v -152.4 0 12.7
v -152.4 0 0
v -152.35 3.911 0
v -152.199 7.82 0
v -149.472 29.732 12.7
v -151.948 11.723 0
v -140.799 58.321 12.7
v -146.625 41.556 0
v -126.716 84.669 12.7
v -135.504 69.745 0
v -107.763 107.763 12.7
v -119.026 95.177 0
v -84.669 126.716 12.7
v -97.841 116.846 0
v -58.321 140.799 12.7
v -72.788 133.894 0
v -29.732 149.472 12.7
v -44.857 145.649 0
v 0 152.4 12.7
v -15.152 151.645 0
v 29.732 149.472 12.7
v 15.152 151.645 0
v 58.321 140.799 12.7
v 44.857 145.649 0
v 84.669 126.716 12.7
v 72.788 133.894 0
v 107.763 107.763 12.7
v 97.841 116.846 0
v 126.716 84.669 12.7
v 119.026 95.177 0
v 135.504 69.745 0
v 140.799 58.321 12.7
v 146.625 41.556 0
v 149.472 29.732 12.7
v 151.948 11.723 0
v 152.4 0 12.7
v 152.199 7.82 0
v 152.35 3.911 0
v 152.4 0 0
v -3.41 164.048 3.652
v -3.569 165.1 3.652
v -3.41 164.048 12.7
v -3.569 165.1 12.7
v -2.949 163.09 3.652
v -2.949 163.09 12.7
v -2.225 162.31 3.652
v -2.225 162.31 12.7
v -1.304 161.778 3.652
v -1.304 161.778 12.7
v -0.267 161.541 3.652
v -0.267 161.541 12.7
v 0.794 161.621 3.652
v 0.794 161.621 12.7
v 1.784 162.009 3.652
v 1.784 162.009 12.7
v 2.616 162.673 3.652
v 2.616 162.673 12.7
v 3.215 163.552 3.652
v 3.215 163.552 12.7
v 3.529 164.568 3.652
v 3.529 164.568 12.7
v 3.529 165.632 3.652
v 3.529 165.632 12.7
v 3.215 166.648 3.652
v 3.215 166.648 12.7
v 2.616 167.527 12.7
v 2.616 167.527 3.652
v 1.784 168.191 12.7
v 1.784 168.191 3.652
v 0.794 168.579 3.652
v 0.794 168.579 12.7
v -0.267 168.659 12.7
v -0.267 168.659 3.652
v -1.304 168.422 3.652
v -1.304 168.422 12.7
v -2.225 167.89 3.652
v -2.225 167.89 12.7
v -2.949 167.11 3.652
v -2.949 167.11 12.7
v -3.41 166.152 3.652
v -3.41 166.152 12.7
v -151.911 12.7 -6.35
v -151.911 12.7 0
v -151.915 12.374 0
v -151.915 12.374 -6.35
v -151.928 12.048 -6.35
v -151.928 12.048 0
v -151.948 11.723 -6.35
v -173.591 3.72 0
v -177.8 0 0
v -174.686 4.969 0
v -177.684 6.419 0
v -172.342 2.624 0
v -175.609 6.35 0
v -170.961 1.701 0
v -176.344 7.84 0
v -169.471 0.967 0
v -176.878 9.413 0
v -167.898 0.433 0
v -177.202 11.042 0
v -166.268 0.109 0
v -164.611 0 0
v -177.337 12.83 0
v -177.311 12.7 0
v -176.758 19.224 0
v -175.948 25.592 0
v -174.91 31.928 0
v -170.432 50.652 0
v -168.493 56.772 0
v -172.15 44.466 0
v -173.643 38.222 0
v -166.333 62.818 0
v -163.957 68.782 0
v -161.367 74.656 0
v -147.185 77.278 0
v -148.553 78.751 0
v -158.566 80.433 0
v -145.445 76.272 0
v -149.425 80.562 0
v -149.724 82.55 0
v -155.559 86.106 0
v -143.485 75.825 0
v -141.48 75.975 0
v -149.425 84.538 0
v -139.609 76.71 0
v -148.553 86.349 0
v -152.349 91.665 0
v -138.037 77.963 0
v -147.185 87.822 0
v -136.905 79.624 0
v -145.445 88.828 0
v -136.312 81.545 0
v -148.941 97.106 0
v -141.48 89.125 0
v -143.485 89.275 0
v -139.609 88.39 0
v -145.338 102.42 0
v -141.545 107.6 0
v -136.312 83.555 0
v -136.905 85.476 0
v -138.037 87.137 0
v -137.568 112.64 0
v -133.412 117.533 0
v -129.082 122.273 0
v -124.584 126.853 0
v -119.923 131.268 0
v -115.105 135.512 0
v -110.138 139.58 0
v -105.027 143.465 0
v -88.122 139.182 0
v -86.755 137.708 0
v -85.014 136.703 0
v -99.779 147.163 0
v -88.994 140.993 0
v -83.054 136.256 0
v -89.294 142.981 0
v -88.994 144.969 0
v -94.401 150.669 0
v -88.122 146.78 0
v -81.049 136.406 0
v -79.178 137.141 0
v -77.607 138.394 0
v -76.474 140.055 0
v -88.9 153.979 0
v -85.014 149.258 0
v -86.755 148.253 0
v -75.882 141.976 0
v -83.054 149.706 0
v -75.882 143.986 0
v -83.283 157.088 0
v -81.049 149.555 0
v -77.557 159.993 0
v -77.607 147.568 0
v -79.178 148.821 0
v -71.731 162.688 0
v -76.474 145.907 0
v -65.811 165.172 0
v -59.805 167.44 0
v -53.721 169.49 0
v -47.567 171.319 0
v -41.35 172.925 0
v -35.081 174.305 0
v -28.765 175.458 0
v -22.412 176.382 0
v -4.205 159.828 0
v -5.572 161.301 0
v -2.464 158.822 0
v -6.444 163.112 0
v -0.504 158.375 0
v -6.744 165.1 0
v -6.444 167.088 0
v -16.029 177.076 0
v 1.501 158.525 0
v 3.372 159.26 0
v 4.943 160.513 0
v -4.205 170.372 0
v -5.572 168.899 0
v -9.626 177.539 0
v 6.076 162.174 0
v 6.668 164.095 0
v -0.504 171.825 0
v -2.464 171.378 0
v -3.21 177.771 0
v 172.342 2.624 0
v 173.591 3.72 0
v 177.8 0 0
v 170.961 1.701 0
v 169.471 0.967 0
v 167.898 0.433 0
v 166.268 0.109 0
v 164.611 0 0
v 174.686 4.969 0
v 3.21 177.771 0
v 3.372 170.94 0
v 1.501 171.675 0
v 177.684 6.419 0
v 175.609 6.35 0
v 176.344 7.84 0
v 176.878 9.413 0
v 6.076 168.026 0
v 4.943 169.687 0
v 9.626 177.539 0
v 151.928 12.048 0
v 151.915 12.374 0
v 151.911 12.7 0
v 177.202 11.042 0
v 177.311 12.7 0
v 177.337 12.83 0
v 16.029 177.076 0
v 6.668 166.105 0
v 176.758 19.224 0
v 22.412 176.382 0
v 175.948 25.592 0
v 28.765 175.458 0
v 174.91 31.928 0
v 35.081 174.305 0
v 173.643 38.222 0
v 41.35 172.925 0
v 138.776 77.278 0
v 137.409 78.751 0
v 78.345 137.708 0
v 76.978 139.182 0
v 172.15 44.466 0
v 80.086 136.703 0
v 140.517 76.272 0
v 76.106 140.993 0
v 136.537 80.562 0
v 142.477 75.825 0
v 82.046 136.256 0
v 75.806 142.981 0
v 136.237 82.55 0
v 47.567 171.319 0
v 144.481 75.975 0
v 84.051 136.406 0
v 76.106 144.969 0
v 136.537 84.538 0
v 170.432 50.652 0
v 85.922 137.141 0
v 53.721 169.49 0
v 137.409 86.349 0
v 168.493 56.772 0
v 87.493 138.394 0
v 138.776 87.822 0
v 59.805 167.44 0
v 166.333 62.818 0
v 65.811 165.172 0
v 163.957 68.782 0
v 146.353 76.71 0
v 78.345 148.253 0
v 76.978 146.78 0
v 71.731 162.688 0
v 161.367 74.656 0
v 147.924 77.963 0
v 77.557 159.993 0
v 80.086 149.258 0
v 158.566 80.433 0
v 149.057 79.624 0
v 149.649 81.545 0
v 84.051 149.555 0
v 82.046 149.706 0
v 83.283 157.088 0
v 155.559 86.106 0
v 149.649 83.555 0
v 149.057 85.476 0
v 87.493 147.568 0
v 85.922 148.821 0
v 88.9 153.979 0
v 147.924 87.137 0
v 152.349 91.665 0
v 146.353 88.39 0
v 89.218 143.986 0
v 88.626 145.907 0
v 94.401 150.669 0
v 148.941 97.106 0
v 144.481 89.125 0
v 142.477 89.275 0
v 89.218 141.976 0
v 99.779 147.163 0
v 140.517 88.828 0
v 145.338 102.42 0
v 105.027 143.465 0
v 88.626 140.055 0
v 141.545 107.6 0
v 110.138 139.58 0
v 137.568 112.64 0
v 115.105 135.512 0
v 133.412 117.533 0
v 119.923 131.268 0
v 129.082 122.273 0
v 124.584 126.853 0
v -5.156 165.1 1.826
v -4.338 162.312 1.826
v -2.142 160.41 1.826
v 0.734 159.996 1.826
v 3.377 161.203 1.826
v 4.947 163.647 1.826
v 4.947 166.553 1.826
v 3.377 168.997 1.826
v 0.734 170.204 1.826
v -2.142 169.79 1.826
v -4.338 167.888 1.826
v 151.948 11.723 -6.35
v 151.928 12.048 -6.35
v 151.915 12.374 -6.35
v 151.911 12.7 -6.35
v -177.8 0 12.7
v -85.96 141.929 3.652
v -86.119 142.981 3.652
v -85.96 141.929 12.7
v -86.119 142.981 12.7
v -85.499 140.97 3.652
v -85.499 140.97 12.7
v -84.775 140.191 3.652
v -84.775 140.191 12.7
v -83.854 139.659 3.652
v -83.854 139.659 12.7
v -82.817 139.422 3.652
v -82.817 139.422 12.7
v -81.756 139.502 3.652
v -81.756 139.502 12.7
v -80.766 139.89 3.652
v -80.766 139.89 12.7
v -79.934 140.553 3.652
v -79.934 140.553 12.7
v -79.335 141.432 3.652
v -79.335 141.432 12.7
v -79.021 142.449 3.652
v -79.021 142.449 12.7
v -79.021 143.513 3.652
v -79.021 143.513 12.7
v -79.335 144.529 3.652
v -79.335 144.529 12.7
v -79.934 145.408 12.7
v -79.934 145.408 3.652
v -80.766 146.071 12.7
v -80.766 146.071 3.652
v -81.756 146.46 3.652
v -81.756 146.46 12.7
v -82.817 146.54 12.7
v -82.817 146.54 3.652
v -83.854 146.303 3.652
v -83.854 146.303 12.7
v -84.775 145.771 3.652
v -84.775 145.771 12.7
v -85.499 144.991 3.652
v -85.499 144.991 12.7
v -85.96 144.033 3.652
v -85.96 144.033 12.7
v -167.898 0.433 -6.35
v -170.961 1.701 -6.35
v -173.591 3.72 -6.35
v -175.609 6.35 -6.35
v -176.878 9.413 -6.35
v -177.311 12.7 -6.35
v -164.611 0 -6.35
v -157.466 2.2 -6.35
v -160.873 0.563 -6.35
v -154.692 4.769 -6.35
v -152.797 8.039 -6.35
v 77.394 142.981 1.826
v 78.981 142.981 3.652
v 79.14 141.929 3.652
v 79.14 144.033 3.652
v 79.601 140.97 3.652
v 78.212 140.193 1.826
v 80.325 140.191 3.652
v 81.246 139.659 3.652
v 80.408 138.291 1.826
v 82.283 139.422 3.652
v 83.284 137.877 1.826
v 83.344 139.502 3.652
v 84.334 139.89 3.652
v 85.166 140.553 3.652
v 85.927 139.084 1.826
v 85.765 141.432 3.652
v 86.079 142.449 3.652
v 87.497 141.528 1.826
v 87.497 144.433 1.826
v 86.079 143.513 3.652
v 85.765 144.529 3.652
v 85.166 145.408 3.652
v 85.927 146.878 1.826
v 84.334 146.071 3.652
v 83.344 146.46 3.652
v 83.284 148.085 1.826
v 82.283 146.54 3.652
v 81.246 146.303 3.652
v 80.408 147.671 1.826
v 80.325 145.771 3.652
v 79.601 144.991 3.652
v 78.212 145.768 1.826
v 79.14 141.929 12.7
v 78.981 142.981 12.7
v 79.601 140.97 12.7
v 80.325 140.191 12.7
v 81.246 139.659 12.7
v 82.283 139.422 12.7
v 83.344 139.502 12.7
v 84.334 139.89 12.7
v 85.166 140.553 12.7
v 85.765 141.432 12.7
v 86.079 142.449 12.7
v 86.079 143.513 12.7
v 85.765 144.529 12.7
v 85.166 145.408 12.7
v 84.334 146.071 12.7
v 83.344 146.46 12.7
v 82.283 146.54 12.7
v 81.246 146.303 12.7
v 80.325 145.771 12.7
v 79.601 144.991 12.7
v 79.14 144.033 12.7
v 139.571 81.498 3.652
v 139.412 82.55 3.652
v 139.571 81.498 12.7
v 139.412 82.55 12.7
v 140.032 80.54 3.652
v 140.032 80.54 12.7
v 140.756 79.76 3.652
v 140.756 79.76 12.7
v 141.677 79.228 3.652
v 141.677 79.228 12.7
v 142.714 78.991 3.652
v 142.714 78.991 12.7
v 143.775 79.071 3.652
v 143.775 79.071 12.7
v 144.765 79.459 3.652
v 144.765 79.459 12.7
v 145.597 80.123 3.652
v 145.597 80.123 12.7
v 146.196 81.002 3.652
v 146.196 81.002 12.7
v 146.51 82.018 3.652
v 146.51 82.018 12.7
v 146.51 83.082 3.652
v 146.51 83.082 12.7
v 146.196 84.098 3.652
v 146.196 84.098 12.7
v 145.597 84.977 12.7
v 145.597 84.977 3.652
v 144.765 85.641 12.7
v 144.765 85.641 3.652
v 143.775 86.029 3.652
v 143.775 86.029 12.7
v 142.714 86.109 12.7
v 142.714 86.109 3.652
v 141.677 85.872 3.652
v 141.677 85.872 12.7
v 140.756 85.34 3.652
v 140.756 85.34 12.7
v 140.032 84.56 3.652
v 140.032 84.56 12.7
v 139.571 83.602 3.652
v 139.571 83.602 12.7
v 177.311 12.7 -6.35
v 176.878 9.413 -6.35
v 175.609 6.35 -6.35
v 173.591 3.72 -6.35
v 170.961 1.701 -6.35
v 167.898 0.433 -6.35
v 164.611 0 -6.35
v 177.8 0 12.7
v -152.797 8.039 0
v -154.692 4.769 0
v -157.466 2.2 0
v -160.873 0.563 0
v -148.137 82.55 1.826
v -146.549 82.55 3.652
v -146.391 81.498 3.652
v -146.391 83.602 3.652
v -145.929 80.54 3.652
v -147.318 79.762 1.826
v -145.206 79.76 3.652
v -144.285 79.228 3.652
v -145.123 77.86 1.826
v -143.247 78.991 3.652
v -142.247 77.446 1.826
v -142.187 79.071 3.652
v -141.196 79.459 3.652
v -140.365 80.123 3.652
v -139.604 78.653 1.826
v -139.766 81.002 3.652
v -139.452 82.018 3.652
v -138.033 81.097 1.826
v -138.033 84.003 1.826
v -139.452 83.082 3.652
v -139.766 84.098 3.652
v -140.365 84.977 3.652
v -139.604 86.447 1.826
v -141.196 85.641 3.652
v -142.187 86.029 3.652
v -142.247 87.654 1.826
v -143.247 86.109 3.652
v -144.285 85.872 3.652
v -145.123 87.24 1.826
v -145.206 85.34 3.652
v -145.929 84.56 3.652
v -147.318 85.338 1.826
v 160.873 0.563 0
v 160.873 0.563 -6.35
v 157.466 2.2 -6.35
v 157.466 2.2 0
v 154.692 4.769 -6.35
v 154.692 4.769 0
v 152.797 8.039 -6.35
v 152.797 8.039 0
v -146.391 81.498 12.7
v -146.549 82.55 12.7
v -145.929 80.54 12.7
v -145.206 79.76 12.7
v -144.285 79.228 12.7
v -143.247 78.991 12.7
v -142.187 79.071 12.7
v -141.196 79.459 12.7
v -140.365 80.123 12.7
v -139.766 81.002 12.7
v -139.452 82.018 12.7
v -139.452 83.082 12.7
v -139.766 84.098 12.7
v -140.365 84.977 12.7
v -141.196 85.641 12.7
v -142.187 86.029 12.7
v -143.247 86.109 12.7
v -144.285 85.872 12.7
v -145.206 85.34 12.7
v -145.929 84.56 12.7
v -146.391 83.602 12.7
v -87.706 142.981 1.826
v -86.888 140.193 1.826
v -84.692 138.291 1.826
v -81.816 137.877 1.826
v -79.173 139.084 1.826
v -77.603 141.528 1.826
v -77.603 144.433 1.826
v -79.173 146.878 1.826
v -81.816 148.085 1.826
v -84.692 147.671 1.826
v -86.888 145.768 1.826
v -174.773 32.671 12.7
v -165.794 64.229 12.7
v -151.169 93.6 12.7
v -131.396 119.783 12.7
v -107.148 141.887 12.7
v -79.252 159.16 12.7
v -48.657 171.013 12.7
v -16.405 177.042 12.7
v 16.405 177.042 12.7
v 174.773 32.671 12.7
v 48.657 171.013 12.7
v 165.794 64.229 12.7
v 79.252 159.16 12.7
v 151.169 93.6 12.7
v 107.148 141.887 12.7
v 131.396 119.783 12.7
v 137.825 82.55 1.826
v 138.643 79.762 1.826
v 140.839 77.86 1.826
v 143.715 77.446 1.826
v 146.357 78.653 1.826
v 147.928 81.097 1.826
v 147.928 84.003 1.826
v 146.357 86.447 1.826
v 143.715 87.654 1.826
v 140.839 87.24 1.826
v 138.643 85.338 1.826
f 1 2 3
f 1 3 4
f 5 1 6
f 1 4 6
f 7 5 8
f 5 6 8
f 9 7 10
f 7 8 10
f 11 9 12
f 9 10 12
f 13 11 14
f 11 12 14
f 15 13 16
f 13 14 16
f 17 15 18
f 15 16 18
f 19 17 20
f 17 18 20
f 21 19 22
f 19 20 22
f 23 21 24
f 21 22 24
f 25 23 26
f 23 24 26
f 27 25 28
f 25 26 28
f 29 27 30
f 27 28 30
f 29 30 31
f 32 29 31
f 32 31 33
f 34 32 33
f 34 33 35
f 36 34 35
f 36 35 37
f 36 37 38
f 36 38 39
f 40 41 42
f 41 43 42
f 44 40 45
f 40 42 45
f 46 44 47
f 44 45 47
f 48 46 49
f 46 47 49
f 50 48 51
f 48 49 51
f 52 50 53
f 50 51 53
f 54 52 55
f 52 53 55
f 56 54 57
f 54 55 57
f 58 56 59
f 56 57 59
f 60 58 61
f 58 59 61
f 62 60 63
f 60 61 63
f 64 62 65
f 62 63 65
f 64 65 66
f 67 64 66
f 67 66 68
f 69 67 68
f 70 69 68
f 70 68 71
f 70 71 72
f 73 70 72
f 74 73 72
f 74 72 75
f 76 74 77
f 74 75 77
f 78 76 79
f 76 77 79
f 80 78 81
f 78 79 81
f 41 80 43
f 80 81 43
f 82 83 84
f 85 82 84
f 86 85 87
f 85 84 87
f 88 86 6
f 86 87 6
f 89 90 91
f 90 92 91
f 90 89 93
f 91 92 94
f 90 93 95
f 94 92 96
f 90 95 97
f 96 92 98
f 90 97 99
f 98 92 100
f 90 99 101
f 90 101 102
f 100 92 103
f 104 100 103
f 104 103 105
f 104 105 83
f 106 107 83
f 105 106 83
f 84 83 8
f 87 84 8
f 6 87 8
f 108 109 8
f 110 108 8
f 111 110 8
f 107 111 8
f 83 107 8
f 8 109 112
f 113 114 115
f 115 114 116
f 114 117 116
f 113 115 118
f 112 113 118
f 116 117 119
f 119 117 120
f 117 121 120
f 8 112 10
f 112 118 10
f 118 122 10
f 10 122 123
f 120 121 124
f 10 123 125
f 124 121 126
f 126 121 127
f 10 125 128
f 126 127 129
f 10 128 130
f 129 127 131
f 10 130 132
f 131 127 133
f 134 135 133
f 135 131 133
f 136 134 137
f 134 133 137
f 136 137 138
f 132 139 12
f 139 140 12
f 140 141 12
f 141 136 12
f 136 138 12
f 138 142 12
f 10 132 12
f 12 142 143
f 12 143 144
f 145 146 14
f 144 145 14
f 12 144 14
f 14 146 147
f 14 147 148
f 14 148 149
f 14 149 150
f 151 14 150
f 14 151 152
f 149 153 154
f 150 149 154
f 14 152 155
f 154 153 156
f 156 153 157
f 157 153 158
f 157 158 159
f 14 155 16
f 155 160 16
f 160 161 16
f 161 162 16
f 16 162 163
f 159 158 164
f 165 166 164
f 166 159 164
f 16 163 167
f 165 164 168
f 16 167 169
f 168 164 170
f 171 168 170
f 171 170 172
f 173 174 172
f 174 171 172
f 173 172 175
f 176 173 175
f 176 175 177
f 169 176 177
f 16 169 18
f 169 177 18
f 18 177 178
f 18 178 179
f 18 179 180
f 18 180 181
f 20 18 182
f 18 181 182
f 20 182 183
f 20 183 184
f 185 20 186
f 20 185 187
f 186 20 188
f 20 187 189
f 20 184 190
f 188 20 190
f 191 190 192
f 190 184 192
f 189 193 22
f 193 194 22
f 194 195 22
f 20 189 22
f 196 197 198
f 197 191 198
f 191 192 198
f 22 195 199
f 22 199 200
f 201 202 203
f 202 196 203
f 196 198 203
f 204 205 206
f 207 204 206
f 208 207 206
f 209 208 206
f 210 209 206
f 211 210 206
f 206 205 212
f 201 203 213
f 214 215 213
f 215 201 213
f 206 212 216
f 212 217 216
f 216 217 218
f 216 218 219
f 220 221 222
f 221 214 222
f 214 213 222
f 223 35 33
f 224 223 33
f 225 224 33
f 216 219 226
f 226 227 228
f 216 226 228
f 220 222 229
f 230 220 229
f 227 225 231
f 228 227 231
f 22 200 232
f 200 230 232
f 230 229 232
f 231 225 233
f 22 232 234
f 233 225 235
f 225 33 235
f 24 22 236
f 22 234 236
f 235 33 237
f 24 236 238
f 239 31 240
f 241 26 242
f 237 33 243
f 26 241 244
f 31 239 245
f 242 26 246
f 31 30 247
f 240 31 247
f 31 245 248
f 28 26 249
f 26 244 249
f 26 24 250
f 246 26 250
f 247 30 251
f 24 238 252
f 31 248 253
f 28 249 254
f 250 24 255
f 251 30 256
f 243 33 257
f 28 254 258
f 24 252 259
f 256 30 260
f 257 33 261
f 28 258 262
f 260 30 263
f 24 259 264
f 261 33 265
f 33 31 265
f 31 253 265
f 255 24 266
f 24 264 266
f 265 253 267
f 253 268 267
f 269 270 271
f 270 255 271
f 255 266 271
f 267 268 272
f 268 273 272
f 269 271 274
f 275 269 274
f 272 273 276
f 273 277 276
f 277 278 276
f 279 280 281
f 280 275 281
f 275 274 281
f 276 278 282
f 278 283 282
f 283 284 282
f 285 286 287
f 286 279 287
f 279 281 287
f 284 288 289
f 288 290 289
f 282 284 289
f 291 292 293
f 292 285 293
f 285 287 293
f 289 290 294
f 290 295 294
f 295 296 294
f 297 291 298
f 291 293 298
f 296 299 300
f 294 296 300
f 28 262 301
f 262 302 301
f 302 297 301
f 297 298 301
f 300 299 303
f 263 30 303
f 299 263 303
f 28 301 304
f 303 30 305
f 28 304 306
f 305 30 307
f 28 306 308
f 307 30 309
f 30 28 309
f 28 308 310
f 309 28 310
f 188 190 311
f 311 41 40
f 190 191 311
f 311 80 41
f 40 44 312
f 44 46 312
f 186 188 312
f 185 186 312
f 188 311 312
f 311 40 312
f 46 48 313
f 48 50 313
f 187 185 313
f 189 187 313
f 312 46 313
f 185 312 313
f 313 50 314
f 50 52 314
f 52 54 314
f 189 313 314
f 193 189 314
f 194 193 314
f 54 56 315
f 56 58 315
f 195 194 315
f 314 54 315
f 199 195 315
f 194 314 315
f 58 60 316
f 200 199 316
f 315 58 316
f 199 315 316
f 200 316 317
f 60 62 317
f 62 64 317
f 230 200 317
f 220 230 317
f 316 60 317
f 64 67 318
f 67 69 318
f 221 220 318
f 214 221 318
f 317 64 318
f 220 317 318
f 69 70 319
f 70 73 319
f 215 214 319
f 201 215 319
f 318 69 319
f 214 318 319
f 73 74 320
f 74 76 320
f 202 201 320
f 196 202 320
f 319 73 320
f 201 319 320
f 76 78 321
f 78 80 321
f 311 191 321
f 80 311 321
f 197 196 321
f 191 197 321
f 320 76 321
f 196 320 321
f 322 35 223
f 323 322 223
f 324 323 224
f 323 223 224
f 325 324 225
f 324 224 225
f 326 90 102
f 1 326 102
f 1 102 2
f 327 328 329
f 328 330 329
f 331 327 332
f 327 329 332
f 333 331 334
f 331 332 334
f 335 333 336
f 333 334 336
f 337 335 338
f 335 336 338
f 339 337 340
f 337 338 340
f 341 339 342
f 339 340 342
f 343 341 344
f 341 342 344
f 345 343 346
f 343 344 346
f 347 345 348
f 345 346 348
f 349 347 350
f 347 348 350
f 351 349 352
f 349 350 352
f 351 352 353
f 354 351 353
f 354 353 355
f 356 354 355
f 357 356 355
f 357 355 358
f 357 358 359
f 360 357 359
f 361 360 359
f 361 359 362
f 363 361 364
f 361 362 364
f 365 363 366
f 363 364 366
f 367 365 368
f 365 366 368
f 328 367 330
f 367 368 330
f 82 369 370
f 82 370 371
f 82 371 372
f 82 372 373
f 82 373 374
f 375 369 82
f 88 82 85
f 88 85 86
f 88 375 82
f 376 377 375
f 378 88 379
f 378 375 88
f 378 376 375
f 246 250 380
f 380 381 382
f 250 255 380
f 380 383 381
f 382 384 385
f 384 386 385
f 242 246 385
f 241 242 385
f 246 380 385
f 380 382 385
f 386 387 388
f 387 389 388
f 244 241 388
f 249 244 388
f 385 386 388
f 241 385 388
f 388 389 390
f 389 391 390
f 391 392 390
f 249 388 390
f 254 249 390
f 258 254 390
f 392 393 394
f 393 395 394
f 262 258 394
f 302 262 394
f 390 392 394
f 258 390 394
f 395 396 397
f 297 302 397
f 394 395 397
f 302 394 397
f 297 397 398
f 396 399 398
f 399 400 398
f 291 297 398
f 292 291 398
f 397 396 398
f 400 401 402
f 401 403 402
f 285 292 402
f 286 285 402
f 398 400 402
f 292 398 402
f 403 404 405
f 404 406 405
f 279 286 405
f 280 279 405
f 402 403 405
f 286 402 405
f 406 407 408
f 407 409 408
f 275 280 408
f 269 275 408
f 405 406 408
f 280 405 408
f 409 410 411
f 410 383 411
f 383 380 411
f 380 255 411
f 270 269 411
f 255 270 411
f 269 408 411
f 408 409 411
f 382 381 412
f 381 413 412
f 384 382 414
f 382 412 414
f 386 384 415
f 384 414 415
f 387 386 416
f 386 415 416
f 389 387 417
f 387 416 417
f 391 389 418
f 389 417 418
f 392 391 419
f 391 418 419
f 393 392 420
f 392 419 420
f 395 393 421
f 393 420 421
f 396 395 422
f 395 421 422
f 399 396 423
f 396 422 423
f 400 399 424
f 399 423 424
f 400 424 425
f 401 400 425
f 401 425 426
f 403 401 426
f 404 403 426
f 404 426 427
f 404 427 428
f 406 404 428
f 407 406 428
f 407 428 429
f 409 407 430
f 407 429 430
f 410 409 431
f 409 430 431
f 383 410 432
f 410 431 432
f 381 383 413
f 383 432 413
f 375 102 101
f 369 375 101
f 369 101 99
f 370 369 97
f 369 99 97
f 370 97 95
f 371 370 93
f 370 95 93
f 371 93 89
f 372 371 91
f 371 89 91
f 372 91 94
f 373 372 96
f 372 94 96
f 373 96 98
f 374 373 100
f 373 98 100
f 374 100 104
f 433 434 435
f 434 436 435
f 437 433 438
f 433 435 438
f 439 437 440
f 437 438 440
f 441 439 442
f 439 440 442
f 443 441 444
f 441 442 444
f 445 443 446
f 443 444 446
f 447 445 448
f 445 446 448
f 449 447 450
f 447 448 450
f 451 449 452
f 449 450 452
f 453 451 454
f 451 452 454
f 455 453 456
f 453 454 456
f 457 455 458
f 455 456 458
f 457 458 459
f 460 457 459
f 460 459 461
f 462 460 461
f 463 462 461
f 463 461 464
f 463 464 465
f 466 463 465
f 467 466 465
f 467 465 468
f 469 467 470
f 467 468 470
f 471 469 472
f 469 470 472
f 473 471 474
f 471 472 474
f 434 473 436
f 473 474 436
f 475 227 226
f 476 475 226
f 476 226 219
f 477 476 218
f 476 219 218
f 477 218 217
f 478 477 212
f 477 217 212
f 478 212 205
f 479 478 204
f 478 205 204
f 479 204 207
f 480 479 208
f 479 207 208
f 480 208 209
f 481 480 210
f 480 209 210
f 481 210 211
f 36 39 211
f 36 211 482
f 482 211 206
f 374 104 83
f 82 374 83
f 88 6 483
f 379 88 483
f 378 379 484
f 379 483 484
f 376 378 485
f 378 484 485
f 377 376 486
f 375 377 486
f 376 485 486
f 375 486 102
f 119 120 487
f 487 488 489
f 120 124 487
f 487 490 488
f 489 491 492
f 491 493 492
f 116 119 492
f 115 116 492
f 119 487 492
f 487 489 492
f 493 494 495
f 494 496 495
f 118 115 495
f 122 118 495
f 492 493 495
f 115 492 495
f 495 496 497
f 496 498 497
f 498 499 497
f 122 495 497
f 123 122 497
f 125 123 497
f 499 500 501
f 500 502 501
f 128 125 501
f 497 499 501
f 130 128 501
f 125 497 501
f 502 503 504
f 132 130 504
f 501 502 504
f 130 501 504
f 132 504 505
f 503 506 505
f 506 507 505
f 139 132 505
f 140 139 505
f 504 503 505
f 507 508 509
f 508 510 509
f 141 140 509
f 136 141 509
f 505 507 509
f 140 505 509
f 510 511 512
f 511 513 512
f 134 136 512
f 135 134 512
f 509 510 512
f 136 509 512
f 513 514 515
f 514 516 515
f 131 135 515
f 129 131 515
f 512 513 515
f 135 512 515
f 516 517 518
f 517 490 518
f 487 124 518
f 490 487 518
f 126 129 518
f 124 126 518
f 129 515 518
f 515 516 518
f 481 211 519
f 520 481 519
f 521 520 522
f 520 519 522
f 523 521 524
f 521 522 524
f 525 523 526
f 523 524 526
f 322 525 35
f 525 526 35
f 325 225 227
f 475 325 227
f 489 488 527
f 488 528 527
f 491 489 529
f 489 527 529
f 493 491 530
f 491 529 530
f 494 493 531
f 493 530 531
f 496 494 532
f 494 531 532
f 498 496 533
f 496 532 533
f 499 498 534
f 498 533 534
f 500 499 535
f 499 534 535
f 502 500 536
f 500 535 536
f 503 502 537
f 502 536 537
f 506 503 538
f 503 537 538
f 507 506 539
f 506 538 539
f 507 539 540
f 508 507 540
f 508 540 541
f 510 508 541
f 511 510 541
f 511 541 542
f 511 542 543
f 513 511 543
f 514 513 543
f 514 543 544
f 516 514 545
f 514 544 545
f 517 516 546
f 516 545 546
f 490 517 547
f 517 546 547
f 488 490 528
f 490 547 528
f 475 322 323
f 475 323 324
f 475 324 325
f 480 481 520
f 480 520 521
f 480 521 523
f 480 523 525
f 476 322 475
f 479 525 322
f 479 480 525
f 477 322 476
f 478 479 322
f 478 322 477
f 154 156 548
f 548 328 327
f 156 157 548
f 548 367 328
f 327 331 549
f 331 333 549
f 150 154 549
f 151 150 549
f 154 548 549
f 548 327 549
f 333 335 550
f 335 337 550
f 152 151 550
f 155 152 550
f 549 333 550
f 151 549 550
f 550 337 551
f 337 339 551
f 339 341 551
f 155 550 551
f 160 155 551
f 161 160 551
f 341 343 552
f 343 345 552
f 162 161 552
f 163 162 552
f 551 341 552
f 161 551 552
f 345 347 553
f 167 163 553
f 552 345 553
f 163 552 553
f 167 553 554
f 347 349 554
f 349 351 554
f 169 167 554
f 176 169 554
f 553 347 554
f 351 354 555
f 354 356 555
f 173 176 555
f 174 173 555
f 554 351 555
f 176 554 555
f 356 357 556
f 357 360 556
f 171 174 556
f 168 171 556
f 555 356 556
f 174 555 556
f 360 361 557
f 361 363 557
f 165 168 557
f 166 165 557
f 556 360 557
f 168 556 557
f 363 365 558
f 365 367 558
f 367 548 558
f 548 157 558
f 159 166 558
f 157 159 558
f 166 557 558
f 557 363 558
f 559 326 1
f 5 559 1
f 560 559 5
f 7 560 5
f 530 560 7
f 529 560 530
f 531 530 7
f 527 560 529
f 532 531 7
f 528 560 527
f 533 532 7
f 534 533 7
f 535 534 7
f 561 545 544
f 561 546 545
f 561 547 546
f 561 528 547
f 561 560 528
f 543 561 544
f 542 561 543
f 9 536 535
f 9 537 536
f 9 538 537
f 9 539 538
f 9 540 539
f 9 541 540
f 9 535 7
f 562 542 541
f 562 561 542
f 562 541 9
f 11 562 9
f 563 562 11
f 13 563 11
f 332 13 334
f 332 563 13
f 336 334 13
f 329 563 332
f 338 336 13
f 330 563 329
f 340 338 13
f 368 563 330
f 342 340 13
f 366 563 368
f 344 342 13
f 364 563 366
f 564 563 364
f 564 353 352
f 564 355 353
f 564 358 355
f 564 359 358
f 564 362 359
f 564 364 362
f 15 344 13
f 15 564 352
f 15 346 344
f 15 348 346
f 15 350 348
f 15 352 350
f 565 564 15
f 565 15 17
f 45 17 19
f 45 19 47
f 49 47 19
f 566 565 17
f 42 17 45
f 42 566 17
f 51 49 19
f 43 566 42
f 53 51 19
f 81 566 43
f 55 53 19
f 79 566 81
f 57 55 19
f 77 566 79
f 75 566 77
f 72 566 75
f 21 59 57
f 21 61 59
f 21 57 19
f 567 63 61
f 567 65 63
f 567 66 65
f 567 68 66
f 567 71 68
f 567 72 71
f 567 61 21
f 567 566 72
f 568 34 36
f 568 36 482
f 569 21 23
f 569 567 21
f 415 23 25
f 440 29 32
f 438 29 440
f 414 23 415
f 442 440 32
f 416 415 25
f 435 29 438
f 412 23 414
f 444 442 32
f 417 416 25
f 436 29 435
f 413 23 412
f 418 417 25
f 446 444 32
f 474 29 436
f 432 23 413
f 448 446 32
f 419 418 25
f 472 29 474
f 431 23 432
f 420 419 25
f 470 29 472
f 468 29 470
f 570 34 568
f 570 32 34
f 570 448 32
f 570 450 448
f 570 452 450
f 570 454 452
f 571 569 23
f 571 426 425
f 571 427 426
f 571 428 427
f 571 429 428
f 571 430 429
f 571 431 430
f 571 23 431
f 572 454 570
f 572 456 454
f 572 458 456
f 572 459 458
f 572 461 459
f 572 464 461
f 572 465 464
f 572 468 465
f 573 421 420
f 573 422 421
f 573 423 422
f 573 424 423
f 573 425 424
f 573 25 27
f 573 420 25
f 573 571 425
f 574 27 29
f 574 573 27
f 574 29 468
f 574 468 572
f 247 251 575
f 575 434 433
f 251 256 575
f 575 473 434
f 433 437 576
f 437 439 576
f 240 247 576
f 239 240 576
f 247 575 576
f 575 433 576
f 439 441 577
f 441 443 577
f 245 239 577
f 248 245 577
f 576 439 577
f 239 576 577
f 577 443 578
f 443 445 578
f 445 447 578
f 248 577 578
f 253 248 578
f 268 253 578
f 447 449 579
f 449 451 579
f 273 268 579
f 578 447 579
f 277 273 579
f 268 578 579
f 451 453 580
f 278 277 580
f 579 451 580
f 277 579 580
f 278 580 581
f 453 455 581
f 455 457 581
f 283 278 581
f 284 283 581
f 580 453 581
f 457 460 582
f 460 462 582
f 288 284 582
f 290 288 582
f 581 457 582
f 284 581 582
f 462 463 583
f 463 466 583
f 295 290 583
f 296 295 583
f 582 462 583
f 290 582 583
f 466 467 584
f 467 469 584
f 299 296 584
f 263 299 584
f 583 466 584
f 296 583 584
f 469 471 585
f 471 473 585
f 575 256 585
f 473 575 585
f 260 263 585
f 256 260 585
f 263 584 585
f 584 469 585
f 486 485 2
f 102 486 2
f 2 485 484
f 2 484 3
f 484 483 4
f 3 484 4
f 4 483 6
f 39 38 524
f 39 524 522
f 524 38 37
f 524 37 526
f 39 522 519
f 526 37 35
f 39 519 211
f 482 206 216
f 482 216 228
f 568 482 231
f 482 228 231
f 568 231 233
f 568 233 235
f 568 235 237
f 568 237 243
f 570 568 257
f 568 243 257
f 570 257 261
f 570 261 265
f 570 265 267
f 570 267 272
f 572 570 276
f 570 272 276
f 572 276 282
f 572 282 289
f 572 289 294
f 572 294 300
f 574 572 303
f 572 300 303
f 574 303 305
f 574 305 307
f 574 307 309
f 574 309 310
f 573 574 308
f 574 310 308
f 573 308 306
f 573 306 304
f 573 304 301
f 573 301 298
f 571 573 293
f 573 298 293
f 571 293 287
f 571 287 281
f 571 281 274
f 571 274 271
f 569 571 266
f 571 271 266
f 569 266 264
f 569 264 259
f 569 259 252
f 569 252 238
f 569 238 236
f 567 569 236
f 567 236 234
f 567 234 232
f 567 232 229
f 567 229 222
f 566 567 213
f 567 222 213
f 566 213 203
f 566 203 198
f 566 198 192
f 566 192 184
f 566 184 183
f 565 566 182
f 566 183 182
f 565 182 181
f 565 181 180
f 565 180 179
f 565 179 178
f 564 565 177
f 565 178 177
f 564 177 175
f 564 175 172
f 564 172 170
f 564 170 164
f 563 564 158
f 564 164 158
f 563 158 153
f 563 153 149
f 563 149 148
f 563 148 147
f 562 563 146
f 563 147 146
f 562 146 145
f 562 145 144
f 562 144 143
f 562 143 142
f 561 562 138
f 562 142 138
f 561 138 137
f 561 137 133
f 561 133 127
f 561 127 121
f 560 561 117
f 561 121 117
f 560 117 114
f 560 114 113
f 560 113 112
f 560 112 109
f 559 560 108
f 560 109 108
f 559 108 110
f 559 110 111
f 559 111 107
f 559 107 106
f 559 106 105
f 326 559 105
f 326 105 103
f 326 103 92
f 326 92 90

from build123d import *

# Parameters (mm, degrees)
F1_DEPTH       = 12.7
F3_DEPTH       = 6.35
F5_D           = 7.1374
F5_CSINK_D     = 13.4874
F5_CSINK_ANGLE = 82


with BuildPart() as f1:
    # F0 (on Top) → F1 (new body)
    with BuildSketch(Plane.XY):
        with BuildLine():
            Line((-177.8, 0), (-152.4, 0))
            ThreePointArc((-152.4, 0), (0, 152.4), (152.4, 0))
            Line((152.4, 0), (177.8, 0))
            ThreePointArc((177.8, 0), (0, 177.8), (-177.8, 0))
        make_face()
    extrude(amount=F1_DEPTH)

    # F2 (on face) → F3 (join)
    with BuildSketch(Plane(origin=(0, 0, 0), x_dir=(1, 0, 0), z_dir=(0, 0, -1))):
        with BuildLine():
            Line((-164.6108137396, -12.7), (-151.9108137396, -12.7))
            ThreePointArc((-151.9108137396, -12.7), (-151.9202246619, -12.2111760422), (-151.9484434816, -11.7230765386))
            ThreePointArc((-151.9484434816, -11.7230765386), (-155.9828628767, -3.3807476744), (-164.6108137281, 0))
            ThreePointArc((-164.6108137281, 0), (-173.5910698566, -3.7197438749), (-177.3108137396, -12.7))
            Line((-177.3108137396, -12.7), (-164.6108137396, -12.7))
        make_face()
        with BuildLine():
            ThreePointArc((151.9484434411, -11.7230770637), (151.9202246518, -12.2111763053), (151.9108137396, -12.7))
            Line((151.9108137396, -12.7), (177.3108137396, -12.7))
            ThreePointArc((177.3108137396, -12.7), (173.5910698566, -3.7197438749), (164.6108137281, 0))
            ThreePointArc((164.6108137281, 0), (155.9828626834, -3.3807478534), (151.9484434411, -11.7230770637))
        make_face()
    extrude(amount=F3_DEPTH)

    # F5 (through all)
    with Locations(Plane(origin=(0, 0, 0), x_dir=(1, 0, 0), z_dir=(0, 0, -1))):
        with Locations((-142.9807941648, -82.55), (-82.55, -142.9807941648), (0, -165.1), (82.55, -142.9807941648), (142.9807941648, -82.55)):
            CounterSinkHole(F5_D / 2, F5_CSINK_D / 2, counter_sink_angle=F5_CSINK_ANGLE)


solid = f1.part
